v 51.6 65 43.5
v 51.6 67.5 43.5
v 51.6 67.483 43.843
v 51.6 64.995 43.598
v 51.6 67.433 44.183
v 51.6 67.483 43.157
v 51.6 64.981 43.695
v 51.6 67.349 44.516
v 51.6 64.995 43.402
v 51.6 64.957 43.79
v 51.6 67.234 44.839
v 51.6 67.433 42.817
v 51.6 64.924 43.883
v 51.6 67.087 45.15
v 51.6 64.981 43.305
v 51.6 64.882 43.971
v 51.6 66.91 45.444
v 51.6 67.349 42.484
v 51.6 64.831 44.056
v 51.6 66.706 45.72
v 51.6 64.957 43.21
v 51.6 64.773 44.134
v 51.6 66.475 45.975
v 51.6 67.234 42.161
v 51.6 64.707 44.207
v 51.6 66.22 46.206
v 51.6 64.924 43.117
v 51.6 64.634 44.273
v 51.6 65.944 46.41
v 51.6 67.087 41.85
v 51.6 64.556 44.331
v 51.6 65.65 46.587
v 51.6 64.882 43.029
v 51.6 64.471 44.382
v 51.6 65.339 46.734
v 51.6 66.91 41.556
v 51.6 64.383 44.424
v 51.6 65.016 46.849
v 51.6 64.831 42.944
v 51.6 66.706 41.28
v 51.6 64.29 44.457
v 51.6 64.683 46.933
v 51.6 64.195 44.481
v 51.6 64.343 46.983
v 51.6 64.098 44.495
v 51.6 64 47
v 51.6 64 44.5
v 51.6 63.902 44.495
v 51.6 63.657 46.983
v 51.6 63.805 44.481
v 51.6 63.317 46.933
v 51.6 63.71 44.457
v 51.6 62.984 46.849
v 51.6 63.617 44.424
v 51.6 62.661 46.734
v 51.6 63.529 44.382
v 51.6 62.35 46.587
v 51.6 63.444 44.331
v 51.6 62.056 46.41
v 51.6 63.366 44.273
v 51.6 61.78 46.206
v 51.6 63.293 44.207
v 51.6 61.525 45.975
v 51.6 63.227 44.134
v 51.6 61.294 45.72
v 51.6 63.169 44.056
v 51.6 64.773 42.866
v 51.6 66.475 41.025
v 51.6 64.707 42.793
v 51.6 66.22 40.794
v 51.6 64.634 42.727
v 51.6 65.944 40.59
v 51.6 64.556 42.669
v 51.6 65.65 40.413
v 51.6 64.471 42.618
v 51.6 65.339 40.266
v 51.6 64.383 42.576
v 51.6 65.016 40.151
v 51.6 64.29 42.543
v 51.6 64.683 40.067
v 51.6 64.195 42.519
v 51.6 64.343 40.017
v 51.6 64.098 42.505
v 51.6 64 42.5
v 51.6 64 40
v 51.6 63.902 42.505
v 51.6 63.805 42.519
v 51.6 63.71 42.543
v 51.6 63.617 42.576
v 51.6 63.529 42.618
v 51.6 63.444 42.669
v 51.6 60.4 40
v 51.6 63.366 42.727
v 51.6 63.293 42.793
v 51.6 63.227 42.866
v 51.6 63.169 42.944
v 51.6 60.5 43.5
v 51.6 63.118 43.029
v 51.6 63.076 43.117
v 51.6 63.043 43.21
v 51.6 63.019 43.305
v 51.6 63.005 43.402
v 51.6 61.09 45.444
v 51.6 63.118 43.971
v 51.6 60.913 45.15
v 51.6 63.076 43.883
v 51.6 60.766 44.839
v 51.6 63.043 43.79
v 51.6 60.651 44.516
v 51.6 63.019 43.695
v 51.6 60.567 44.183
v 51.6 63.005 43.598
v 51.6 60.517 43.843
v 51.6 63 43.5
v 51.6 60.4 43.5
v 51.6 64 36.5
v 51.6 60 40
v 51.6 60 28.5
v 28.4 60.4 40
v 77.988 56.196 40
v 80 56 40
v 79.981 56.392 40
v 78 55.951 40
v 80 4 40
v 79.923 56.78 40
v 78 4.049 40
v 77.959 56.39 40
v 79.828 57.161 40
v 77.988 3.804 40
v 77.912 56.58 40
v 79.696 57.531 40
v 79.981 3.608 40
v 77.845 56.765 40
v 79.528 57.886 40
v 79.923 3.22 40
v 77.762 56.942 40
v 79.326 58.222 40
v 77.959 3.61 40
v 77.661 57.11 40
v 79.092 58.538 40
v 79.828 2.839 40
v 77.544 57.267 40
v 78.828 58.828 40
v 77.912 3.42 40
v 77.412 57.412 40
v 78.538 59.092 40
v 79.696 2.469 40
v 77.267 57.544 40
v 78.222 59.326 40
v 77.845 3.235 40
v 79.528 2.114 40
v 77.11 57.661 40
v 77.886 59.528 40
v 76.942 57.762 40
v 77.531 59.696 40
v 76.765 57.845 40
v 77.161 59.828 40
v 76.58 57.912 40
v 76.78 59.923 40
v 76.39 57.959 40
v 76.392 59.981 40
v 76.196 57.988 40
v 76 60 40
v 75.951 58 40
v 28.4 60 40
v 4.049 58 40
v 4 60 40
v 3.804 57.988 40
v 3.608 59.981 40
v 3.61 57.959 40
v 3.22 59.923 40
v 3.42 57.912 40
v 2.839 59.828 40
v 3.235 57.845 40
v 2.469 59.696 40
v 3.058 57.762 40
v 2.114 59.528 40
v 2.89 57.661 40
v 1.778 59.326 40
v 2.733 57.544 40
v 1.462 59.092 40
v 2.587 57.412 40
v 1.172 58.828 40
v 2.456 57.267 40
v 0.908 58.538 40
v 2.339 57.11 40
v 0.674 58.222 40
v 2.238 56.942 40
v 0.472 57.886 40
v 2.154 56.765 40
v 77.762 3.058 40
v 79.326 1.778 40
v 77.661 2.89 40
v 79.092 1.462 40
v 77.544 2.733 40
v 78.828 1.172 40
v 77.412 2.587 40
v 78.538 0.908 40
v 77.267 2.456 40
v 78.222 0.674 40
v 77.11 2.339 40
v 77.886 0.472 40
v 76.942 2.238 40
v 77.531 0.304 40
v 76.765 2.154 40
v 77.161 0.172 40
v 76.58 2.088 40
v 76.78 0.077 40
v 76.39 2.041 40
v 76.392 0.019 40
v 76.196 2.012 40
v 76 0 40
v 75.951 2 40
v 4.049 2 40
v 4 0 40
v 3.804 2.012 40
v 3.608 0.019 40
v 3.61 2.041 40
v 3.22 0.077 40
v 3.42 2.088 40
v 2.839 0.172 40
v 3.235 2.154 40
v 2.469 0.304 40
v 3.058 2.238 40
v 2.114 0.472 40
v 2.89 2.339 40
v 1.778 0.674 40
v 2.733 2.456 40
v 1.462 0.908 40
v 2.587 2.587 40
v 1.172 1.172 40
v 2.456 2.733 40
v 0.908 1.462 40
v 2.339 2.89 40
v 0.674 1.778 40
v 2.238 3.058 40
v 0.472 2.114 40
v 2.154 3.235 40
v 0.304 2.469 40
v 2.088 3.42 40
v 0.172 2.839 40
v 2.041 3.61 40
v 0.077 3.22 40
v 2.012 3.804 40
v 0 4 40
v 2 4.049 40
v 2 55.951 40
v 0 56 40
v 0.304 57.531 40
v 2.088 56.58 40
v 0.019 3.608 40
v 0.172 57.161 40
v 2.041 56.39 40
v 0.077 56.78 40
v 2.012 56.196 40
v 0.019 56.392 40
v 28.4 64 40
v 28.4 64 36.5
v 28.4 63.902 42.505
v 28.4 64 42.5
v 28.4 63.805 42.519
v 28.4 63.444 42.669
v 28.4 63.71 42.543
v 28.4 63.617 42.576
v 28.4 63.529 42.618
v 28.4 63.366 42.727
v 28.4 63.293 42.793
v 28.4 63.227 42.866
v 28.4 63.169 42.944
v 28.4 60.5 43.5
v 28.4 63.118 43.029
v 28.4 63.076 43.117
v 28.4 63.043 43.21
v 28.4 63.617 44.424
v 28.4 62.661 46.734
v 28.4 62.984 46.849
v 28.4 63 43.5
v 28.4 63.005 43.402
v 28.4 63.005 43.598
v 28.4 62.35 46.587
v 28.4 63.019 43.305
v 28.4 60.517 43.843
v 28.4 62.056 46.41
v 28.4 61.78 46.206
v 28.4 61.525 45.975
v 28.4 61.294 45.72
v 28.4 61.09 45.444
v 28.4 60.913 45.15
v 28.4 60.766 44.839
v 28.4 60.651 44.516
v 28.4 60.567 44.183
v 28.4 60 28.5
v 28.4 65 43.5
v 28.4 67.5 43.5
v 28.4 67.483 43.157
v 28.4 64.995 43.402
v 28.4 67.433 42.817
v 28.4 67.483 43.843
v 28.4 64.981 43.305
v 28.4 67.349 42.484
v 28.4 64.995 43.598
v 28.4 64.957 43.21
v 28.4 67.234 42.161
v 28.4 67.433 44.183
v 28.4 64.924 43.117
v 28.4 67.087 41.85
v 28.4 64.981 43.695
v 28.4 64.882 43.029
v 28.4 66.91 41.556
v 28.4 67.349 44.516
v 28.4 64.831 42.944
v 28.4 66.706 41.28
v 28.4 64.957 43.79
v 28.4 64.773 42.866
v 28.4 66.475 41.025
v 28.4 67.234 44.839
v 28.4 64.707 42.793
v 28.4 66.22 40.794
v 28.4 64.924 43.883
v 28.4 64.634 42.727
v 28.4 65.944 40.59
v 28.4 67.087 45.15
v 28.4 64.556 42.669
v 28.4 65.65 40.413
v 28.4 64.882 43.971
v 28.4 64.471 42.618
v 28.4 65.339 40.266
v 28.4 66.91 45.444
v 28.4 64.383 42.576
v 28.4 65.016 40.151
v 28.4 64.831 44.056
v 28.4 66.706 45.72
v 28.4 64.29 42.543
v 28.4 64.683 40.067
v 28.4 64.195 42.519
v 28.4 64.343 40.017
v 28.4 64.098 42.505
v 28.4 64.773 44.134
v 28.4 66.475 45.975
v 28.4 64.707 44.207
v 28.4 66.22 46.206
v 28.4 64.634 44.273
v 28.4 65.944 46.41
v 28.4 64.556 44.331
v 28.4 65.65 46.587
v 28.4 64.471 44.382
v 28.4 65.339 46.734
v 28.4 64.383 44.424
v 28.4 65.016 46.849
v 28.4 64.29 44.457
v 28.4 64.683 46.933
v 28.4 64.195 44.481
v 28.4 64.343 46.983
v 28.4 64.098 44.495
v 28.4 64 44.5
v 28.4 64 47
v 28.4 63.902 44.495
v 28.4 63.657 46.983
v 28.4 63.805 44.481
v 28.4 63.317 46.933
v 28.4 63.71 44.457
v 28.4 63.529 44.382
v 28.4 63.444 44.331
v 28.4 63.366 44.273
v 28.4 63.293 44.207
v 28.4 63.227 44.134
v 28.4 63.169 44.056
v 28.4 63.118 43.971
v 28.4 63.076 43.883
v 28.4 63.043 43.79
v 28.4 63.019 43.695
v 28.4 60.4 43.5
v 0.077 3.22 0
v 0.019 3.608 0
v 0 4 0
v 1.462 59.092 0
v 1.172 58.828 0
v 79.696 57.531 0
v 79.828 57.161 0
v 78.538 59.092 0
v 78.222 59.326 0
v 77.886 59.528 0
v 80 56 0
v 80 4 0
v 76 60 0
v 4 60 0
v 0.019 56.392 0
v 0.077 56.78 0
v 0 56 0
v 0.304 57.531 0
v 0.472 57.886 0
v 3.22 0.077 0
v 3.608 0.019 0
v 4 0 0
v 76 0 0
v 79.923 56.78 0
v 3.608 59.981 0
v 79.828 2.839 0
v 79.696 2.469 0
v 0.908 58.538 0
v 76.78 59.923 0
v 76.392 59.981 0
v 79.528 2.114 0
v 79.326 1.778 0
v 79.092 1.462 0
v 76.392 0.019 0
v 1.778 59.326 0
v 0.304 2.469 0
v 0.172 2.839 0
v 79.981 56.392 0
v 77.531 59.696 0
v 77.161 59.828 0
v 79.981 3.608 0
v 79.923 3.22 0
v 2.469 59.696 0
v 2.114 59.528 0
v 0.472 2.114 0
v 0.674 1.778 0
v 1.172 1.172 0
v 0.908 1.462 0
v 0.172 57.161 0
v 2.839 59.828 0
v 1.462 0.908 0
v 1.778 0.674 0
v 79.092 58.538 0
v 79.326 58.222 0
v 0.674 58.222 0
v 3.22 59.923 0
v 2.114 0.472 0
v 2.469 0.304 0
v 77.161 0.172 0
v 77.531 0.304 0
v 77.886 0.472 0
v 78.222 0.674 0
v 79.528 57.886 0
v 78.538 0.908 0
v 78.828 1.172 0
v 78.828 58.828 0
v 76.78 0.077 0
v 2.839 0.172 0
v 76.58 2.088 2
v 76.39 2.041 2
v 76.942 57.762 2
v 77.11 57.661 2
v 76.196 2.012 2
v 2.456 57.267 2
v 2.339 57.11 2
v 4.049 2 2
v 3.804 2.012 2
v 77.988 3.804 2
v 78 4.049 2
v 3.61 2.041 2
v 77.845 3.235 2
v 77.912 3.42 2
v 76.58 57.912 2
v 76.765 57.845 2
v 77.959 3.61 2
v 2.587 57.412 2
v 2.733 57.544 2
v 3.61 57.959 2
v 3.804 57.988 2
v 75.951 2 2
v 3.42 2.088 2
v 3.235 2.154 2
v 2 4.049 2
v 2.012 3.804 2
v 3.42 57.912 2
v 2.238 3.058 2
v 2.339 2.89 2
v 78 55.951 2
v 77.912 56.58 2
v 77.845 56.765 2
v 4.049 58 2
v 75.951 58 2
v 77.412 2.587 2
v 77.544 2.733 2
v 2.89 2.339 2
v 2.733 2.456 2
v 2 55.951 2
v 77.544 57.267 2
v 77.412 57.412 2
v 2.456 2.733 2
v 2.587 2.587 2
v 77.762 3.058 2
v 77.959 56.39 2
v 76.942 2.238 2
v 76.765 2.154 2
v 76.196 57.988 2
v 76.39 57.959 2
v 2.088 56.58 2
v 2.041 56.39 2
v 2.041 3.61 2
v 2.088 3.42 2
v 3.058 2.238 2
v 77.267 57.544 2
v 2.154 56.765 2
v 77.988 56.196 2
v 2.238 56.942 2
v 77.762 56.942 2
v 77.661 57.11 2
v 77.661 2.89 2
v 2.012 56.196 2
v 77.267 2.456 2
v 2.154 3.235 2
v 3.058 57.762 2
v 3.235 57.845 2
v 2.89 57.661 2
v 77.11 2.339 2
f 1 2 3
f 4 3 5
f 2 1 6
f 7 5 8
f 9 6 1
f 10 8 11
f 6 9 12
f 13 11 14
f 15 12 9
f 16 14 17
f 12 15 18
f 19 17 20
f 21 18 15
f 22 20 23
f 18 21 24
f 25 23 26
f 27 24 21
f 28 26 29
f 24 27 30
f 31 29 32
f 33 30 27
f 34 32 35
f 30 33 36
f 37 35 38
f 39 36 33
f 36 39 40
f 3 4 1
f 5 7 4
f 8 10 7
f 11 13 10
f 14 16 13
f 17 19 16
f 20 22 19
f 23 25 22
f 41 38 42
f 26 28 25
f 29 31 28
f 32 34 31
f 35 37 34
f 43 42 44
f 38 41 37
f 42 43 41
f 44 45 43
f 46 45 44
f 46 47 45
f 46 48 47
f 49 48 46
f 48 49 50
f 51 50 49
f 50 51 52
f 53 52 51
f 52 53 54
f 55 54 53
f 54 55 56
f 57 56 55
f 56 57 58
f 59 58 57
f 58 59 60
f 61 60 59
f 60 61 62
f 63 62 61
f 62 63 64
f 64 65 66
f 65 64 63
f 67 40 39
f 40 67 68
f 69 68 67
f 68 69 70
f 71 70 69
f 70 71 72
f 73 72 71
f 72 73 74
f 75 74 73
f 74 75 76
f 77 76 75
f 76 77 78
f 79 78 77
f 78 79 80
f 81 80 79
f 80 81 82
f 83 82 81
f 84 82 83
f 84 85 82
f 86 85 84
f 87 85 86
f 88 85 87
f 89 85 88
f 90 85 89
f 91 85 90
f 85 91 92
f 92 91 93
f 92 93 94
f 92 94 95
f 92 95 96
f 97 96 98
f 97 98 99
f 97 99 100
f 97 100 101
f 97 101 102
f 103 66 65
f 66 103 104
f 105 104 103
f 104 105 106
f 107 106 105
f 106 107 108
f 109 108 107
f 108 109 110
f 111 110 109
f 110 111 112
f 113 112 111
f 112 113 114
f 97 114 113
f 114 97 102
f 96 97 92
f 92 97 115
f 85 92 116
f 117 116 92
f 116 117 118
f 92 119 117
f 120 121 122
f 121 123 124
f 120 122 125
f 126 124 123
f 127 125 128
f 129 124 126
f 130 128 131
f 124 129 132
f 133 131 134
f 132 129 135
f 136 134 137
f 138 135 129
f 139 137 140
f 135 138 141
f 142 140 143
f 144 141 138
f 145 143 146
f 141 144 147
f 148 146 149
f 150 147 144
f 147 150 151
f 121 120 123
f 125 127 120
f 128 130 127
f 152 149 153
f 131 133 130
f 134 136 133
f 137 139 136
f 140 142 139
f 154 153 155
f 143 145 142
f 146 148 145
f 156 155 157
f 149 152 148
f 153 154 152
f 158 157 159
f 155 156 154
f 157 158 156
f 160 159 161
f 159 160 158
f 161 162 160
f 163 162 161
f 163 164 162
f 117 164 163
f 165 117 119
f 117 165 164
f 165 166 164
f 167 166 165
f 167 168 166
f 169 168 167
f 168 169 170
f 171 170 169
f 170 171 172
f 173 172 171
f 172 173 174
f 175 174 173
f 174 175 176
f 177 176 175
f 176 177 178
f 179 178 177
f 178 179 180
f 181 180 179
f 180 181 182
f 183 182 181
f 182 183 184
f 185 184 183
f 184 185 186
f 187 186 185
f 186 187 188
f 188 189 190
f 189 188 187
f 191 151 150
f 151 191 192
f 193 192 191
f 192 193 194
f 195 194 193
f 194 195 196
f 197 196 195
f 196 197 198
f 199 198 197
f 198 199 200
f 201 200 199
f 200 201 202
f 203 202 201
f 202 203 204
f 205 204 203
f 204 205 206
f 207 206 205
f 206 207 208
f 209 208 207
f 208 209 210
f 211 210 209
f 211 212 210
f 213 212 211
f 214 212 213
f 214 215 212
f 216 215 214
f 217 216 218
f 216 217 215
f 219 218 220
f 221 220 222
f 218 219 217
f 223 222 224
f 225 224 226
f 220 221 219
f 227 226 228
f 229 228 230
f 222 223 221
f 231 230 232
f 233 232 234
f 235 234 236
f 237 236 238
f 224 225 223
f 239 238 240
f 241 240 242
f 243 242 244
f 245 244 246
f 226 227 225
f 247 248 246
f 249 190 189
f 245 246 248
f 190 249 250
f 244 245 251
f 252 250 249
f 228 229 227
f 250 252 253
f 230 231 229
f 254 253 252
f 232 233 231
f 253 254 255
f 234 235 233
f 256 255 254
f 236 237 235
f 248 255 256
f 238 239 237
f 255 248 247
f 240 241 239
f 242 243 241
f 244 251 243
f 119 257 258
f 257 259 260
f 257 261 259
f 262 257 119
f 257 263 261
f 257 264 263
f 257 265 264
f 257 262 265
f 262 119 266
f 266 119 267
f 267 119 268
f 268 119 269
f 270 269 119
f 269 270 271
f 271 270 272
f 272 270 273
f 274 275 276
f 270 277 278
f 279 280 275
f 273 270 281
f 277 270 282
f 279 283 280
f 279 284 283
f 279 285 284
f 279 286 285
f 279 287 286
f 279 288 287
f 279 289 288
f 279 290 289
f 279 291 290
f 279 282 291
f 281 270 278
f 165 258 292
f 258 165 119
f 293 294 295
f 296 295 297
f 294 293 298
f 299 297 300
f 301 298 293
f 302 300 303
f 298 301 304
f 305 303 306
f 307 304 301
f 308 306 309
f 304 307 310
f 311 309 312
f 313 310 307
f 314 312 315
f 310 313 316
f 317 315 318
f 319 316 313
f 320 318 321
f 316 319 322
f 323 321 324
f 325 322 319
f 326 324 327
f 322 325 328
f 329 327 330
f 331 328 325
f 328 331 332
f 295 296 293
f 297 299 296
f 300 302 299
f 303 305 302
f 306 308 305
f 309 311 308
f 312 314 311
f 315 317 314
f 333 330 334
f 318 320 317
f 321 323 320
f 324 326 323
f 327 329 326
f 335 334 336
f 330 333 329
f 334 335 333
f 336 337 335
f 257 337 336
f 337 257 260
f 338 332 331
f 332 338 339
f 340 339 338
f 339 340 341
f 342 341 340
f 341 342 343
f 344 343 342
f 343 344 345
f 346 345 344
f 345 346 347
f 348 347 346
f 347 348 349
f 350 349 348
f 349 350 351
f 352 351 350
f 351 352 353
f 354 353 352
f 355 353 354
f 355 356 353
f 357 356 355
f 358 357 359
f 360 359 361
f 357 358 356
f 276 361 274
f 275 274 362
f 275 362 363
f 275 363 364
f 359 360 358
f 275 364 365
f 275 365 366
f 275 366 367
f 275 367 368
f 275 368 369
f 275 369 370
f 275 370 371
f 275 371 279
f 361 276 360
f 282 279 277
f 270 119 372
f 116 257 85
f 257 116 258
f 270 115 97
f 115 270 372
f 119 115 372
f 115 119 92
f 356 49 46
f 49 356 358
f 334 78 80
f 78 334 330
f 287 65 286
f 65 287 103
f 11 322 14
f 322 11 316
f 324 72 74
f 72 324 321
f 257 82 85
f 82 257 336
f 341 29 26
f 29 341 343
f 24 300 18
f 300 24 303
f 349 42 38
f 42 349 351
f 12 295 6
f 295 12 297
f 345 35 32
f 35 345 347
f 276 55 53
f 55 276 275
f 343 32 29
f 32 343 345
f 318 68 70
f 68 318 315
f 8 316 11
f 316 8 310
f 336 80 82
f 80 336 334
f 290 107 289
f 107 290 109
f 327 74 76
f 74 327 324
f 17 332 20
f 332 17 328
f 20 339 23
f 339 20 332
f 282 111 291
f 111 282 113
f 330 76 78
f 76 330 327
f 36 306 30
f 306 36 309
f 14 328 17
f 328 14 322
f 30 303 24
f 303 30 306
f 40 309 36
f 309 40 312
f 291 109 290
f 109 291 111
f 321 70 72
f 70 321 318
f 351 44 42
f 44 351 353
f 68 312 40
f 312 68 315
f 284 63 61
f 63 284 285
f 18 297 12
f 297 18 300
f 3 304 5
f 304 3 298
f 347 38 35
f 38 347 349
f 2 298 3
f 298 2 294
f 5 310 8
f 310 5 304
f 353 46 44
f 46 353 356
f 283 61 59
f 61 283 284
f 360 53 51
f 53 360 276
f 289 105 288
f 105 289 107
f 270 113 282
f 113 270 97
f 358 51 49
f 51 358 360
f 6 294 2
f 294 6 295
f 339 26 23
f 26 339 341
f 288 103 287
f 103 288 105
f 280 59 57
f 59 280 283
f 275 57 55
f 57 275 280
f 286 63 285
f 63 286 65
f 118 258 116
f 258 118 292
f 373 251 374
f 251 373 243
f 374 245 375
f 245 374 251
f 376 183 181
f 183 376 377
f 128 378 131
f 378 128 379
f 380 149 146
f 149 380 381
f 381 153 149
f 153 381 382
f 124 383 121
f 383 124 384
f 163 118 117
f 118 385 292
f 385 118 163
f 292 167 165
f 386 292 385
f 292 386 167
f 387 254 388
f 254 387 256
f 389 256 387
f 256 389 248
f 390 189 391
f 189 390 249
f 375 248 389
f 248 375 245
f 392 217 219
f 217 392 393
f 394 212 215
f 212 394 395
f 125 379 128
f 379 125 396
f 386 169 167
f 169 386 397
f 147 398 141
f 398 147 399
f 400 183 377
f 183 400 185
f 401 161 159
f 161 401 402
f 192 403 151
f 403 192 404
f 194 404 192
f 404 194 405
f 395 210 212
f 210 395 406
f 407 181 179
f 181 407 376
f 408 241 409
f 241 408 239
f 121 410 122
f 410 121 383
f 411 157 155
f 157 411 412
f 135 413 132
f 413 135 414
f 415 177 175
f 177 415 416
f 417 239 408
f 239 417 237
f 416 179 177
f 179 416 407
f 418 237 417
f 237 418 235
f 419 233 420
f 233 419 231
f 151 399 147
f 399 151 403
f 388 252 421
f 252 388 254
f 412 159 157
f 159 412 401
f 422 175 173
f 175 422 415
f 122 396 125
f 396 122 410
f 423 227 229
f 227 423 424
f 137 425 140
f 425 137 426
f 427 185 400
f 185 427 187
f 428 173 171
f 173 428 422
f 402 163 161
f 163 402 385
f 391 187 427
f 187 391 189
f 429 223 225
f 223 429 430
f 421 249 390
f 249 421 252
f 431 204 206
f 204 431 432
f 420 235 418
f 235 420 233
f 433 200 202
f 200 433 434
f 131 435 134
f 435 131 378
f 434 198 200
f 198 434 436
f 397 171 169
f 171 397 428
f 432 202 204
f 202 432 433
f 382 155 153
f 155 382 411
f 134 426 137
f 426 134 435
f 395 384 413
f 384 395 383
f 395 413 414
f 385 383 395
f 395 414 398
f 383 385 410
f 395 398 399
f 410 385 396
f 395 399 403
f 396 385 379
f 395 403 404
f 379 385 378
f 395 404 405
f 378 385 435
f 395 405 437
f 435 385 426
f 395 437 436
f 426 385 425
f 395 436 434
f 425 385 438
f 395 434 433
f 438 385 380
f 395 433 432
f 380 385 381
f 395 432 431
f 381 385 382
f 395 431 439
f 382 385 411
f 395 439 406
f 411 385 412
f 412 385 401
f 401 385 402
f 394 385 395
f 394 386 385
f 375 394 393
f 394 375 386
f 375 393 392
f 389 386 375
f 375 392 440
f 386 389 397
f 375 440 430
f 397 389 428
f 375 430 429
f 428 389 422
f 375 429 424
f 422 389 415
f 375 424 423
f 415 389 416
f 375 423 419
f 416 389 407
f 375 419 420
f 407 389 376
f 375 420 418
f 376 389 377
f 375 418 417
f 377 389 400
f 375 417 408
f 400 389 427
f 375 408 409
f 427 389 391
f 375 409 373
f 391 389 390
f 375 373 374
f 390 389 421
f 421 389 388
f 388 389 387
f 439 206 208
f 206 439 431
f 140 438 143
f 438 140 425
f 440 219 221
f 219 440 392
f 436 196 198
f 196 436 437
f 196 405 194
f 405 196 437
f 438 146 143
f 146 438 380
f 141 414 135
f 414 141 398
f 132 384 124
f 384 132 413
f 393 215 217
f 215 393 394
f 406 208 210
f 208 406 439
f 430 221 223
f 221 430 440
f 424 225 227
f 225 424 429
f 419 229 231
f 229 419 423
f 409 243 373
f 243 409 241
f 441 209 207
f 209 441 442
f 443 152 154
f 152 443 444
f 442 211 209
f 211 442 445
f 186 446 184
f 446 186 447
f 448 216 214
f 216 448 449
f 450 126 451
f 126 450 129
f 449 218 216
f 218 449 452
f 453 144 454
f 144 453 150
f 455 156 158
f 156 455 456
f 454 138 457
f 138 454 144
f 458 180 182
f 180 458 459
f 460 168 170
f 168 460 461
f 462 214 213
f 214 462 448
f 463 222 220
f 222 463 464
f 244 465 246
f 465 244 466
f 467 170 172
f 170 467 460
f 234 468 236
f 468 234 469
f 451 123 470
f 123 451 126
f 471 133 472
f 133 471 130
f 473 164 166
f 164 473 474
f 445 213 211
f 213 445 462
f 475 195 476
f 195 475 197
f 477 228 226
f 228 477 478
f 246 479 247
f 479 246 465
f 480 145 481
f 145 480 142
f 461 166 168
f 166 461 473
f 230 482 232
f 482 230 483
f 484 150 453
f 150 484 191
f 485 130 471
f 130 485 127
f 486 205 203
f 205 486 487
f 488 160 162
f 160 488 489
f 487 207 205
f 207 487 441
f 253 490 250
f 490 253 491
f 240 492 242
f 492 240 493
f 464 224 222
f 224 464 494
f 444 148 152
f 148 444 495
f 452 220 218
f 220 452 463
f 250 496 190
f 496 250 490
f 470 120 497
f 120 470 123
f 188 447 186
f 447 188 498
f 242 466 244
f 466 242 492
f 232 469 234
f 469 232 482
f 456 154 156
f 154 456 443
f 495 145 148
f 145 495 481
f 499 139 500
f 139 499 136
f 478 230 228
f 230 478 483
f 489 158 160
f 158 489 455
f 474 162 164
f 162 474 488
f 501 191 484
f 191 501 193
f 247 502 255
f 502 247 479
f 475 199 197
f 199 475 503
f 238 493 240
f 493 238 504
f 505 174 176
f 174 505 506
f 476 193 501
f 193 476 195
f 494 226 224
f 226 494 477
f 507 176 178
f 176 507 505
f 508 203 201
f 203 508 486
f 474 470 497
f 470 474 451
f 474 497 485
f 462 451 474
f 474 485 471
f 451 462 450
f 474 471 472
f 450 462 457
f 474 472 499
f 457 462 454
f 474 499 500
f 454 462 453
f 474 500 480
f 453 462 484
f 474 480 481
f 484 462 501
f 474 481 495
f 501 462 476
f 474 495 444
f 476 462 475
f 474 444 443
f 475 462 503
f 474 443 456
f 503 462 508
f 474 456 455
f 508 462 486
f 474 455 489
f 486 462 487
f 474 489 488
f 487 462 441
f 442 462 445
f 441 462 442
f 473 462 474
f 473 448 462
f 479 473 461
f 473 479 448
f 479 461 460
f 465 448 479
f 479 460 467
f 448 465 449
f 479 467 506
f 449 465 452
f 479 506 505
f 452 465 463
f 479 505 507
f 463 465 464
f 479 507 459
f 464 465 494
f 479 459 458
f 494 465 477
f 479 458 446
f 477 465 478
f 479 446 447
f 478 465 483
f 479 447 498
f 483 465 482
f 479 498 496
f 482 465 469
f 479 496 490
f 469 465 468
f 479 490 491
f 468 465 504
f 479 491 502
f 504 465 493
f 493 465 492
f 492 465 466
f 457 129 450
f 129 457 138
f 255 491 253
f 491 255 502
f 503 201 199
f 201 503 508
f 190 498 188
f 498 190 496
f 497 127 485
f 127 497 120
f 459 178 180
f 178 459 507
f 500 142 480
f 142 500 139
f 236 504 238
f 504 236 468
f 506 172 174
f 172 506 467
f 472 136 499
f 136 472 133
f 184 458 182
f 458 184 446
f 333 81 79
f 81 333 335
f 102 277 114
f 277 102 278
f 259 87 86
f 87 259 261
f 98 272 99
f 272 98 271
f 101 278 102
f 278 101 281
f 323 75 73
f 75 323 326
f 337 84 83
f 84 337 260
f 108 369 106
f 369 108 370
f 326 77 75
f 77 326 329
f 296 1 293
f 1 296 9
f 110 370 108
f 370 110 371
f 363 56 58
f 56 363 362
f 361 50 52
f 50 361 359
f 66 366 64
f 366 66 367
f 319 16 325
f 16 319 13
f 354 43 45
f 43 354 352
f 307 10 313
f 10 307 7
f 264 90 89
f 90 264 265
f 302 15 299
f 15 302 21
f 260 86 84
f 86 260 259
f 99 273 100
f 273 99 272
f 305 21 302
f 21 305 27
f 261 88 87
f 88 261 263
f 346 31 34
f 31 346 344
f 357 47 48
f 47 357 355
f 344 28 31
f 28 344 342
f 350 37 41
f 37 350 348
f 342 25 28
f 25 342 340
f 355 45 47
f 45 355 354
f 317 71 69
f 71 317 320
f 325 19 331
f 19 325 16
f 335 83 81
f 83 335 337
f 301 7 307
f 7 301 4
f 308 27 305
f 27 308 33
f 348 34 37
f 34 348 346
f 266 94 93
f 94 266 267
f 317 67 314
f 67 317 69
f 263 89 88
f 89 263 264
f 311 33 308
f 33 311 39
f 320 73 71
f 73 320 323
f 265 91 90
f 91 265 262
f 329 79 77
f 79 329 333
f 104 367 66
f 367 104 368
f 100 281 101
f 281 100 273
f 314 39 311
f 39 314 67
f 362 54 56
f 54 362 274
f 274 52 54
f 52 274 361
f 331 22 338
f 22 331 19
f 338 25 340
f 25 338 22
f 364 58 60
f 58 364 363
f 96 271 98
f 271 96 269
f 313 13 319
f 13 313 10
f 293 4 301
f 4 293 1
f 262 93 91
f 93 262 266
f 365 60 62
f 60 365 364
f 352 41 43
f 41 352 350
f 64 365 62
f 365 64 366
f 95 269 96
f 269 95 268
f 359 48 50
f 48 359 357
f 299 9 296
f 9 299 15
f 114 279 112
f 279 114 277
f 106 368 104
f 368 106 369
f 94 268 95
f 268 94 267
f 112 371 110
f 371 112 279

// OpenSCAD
// file: ../lib/params.scad
// Shared sizes for the box and its lid (both parts include this file).
/* [Box] */
// Width (mm)
box_w = 80; // [40:1:200]
// Depth (mm)
box_d = 60; // [30:1:200]
// Height without the lid (mm)
box_h = 40; // [15:1:150]
// Wall thickness (mm)
wall = 2; // [1.2:0.2:4]
// Corner radius (mm)
corner = 4; // [1:0.5:10]
// Lid thickness (mm)
lid_t = 2.4; // [1.6:0.2:4]

/* [Hinge] */
// Hinge loop radius (mm)
knuckle_r = 3.5; // [2.5:0.5:6]
// Filament pin hole (mm)
pin_d = 2.0; // [1.8:0.1:2.4]
// Gap between loops (mm)
gap = 0.4; // [0.2:0.05:0.8]
// Lid swing room (mm)
swing_gap = 0.5; // [0.3:0.1:1.5]

/* [Hidden] */
// hinge axis: just behind the back wall (plus swing_gap), a loop radius above the rim
hinge_y = box_d + swing_gap + knuckle_r;
hinge_z = box_h + knuckle_r;
k_len = (box_w - 2 * corner) / 3; // length of each hinge loop

module rounded_rect(w, d, r) {
  hull() for (x = [r, w - r], y = [r, d - r]) translate([x, y]) circle(r);
}
// main file
// Box with a hinged lid: the box. The lid's two hinge loops sit either side of this middle loop;
// a 1.75 mm filament offcut is the hinge pin.

/* [Hidden] */
include <../lib/params.scad>
$fn = $preview ? 32 : 64;

difference() {
  union() {
    linear_extrude(box_h) rounded_rect(box_w, box_d, corner);
    // middle hinge loop on a bracket behind the back wall
    translate([corner + k_len + gap, 0, 0]) {
      // bracket: below the rim it joins the back wall; above the rim it stays clear of the lid (gap)
      translate([0, box_d - 1, box_h - knuckle_r]) cube([k_len - 2 * gap, hinge_y - box_d + 1, knuckle_r]);
      translate([0, box_d + gap, box_h - 0.01]) cube([k_len - 2 * gap, hinge_y - box_d - gap, knuckle_r + 0.01]);
      translate([0, hinge_y, hinge_z]) rotate([0, 90, 0]) cylinder(r = knuckle_r, h = k_len - 2 * gap);
      // gusset under the loop so it prints without supports
      hull() {
        translate([0, box_d - 1, box_h - knuckle_r - 8]) cube([k_len - 2 * gap, 1, 1]);
        translate([0, box_d - 1, box_h - knuckle_r]) cube([k_len - 2 * gap, hinge_y - box_d + 1, 0.01]);
      }
    }
  }
  // hollow inside
  translate([0, 0, wall]) linear_extrude(box_h) offset(-wall) rounded_rect(box_w, box_d, corner);
  // pin hole
  translate([-1, hinge_y, hinge_z]) rotate([0, 90, 0]) cylinder(d = pin_d, h = box_w + 2);
}
